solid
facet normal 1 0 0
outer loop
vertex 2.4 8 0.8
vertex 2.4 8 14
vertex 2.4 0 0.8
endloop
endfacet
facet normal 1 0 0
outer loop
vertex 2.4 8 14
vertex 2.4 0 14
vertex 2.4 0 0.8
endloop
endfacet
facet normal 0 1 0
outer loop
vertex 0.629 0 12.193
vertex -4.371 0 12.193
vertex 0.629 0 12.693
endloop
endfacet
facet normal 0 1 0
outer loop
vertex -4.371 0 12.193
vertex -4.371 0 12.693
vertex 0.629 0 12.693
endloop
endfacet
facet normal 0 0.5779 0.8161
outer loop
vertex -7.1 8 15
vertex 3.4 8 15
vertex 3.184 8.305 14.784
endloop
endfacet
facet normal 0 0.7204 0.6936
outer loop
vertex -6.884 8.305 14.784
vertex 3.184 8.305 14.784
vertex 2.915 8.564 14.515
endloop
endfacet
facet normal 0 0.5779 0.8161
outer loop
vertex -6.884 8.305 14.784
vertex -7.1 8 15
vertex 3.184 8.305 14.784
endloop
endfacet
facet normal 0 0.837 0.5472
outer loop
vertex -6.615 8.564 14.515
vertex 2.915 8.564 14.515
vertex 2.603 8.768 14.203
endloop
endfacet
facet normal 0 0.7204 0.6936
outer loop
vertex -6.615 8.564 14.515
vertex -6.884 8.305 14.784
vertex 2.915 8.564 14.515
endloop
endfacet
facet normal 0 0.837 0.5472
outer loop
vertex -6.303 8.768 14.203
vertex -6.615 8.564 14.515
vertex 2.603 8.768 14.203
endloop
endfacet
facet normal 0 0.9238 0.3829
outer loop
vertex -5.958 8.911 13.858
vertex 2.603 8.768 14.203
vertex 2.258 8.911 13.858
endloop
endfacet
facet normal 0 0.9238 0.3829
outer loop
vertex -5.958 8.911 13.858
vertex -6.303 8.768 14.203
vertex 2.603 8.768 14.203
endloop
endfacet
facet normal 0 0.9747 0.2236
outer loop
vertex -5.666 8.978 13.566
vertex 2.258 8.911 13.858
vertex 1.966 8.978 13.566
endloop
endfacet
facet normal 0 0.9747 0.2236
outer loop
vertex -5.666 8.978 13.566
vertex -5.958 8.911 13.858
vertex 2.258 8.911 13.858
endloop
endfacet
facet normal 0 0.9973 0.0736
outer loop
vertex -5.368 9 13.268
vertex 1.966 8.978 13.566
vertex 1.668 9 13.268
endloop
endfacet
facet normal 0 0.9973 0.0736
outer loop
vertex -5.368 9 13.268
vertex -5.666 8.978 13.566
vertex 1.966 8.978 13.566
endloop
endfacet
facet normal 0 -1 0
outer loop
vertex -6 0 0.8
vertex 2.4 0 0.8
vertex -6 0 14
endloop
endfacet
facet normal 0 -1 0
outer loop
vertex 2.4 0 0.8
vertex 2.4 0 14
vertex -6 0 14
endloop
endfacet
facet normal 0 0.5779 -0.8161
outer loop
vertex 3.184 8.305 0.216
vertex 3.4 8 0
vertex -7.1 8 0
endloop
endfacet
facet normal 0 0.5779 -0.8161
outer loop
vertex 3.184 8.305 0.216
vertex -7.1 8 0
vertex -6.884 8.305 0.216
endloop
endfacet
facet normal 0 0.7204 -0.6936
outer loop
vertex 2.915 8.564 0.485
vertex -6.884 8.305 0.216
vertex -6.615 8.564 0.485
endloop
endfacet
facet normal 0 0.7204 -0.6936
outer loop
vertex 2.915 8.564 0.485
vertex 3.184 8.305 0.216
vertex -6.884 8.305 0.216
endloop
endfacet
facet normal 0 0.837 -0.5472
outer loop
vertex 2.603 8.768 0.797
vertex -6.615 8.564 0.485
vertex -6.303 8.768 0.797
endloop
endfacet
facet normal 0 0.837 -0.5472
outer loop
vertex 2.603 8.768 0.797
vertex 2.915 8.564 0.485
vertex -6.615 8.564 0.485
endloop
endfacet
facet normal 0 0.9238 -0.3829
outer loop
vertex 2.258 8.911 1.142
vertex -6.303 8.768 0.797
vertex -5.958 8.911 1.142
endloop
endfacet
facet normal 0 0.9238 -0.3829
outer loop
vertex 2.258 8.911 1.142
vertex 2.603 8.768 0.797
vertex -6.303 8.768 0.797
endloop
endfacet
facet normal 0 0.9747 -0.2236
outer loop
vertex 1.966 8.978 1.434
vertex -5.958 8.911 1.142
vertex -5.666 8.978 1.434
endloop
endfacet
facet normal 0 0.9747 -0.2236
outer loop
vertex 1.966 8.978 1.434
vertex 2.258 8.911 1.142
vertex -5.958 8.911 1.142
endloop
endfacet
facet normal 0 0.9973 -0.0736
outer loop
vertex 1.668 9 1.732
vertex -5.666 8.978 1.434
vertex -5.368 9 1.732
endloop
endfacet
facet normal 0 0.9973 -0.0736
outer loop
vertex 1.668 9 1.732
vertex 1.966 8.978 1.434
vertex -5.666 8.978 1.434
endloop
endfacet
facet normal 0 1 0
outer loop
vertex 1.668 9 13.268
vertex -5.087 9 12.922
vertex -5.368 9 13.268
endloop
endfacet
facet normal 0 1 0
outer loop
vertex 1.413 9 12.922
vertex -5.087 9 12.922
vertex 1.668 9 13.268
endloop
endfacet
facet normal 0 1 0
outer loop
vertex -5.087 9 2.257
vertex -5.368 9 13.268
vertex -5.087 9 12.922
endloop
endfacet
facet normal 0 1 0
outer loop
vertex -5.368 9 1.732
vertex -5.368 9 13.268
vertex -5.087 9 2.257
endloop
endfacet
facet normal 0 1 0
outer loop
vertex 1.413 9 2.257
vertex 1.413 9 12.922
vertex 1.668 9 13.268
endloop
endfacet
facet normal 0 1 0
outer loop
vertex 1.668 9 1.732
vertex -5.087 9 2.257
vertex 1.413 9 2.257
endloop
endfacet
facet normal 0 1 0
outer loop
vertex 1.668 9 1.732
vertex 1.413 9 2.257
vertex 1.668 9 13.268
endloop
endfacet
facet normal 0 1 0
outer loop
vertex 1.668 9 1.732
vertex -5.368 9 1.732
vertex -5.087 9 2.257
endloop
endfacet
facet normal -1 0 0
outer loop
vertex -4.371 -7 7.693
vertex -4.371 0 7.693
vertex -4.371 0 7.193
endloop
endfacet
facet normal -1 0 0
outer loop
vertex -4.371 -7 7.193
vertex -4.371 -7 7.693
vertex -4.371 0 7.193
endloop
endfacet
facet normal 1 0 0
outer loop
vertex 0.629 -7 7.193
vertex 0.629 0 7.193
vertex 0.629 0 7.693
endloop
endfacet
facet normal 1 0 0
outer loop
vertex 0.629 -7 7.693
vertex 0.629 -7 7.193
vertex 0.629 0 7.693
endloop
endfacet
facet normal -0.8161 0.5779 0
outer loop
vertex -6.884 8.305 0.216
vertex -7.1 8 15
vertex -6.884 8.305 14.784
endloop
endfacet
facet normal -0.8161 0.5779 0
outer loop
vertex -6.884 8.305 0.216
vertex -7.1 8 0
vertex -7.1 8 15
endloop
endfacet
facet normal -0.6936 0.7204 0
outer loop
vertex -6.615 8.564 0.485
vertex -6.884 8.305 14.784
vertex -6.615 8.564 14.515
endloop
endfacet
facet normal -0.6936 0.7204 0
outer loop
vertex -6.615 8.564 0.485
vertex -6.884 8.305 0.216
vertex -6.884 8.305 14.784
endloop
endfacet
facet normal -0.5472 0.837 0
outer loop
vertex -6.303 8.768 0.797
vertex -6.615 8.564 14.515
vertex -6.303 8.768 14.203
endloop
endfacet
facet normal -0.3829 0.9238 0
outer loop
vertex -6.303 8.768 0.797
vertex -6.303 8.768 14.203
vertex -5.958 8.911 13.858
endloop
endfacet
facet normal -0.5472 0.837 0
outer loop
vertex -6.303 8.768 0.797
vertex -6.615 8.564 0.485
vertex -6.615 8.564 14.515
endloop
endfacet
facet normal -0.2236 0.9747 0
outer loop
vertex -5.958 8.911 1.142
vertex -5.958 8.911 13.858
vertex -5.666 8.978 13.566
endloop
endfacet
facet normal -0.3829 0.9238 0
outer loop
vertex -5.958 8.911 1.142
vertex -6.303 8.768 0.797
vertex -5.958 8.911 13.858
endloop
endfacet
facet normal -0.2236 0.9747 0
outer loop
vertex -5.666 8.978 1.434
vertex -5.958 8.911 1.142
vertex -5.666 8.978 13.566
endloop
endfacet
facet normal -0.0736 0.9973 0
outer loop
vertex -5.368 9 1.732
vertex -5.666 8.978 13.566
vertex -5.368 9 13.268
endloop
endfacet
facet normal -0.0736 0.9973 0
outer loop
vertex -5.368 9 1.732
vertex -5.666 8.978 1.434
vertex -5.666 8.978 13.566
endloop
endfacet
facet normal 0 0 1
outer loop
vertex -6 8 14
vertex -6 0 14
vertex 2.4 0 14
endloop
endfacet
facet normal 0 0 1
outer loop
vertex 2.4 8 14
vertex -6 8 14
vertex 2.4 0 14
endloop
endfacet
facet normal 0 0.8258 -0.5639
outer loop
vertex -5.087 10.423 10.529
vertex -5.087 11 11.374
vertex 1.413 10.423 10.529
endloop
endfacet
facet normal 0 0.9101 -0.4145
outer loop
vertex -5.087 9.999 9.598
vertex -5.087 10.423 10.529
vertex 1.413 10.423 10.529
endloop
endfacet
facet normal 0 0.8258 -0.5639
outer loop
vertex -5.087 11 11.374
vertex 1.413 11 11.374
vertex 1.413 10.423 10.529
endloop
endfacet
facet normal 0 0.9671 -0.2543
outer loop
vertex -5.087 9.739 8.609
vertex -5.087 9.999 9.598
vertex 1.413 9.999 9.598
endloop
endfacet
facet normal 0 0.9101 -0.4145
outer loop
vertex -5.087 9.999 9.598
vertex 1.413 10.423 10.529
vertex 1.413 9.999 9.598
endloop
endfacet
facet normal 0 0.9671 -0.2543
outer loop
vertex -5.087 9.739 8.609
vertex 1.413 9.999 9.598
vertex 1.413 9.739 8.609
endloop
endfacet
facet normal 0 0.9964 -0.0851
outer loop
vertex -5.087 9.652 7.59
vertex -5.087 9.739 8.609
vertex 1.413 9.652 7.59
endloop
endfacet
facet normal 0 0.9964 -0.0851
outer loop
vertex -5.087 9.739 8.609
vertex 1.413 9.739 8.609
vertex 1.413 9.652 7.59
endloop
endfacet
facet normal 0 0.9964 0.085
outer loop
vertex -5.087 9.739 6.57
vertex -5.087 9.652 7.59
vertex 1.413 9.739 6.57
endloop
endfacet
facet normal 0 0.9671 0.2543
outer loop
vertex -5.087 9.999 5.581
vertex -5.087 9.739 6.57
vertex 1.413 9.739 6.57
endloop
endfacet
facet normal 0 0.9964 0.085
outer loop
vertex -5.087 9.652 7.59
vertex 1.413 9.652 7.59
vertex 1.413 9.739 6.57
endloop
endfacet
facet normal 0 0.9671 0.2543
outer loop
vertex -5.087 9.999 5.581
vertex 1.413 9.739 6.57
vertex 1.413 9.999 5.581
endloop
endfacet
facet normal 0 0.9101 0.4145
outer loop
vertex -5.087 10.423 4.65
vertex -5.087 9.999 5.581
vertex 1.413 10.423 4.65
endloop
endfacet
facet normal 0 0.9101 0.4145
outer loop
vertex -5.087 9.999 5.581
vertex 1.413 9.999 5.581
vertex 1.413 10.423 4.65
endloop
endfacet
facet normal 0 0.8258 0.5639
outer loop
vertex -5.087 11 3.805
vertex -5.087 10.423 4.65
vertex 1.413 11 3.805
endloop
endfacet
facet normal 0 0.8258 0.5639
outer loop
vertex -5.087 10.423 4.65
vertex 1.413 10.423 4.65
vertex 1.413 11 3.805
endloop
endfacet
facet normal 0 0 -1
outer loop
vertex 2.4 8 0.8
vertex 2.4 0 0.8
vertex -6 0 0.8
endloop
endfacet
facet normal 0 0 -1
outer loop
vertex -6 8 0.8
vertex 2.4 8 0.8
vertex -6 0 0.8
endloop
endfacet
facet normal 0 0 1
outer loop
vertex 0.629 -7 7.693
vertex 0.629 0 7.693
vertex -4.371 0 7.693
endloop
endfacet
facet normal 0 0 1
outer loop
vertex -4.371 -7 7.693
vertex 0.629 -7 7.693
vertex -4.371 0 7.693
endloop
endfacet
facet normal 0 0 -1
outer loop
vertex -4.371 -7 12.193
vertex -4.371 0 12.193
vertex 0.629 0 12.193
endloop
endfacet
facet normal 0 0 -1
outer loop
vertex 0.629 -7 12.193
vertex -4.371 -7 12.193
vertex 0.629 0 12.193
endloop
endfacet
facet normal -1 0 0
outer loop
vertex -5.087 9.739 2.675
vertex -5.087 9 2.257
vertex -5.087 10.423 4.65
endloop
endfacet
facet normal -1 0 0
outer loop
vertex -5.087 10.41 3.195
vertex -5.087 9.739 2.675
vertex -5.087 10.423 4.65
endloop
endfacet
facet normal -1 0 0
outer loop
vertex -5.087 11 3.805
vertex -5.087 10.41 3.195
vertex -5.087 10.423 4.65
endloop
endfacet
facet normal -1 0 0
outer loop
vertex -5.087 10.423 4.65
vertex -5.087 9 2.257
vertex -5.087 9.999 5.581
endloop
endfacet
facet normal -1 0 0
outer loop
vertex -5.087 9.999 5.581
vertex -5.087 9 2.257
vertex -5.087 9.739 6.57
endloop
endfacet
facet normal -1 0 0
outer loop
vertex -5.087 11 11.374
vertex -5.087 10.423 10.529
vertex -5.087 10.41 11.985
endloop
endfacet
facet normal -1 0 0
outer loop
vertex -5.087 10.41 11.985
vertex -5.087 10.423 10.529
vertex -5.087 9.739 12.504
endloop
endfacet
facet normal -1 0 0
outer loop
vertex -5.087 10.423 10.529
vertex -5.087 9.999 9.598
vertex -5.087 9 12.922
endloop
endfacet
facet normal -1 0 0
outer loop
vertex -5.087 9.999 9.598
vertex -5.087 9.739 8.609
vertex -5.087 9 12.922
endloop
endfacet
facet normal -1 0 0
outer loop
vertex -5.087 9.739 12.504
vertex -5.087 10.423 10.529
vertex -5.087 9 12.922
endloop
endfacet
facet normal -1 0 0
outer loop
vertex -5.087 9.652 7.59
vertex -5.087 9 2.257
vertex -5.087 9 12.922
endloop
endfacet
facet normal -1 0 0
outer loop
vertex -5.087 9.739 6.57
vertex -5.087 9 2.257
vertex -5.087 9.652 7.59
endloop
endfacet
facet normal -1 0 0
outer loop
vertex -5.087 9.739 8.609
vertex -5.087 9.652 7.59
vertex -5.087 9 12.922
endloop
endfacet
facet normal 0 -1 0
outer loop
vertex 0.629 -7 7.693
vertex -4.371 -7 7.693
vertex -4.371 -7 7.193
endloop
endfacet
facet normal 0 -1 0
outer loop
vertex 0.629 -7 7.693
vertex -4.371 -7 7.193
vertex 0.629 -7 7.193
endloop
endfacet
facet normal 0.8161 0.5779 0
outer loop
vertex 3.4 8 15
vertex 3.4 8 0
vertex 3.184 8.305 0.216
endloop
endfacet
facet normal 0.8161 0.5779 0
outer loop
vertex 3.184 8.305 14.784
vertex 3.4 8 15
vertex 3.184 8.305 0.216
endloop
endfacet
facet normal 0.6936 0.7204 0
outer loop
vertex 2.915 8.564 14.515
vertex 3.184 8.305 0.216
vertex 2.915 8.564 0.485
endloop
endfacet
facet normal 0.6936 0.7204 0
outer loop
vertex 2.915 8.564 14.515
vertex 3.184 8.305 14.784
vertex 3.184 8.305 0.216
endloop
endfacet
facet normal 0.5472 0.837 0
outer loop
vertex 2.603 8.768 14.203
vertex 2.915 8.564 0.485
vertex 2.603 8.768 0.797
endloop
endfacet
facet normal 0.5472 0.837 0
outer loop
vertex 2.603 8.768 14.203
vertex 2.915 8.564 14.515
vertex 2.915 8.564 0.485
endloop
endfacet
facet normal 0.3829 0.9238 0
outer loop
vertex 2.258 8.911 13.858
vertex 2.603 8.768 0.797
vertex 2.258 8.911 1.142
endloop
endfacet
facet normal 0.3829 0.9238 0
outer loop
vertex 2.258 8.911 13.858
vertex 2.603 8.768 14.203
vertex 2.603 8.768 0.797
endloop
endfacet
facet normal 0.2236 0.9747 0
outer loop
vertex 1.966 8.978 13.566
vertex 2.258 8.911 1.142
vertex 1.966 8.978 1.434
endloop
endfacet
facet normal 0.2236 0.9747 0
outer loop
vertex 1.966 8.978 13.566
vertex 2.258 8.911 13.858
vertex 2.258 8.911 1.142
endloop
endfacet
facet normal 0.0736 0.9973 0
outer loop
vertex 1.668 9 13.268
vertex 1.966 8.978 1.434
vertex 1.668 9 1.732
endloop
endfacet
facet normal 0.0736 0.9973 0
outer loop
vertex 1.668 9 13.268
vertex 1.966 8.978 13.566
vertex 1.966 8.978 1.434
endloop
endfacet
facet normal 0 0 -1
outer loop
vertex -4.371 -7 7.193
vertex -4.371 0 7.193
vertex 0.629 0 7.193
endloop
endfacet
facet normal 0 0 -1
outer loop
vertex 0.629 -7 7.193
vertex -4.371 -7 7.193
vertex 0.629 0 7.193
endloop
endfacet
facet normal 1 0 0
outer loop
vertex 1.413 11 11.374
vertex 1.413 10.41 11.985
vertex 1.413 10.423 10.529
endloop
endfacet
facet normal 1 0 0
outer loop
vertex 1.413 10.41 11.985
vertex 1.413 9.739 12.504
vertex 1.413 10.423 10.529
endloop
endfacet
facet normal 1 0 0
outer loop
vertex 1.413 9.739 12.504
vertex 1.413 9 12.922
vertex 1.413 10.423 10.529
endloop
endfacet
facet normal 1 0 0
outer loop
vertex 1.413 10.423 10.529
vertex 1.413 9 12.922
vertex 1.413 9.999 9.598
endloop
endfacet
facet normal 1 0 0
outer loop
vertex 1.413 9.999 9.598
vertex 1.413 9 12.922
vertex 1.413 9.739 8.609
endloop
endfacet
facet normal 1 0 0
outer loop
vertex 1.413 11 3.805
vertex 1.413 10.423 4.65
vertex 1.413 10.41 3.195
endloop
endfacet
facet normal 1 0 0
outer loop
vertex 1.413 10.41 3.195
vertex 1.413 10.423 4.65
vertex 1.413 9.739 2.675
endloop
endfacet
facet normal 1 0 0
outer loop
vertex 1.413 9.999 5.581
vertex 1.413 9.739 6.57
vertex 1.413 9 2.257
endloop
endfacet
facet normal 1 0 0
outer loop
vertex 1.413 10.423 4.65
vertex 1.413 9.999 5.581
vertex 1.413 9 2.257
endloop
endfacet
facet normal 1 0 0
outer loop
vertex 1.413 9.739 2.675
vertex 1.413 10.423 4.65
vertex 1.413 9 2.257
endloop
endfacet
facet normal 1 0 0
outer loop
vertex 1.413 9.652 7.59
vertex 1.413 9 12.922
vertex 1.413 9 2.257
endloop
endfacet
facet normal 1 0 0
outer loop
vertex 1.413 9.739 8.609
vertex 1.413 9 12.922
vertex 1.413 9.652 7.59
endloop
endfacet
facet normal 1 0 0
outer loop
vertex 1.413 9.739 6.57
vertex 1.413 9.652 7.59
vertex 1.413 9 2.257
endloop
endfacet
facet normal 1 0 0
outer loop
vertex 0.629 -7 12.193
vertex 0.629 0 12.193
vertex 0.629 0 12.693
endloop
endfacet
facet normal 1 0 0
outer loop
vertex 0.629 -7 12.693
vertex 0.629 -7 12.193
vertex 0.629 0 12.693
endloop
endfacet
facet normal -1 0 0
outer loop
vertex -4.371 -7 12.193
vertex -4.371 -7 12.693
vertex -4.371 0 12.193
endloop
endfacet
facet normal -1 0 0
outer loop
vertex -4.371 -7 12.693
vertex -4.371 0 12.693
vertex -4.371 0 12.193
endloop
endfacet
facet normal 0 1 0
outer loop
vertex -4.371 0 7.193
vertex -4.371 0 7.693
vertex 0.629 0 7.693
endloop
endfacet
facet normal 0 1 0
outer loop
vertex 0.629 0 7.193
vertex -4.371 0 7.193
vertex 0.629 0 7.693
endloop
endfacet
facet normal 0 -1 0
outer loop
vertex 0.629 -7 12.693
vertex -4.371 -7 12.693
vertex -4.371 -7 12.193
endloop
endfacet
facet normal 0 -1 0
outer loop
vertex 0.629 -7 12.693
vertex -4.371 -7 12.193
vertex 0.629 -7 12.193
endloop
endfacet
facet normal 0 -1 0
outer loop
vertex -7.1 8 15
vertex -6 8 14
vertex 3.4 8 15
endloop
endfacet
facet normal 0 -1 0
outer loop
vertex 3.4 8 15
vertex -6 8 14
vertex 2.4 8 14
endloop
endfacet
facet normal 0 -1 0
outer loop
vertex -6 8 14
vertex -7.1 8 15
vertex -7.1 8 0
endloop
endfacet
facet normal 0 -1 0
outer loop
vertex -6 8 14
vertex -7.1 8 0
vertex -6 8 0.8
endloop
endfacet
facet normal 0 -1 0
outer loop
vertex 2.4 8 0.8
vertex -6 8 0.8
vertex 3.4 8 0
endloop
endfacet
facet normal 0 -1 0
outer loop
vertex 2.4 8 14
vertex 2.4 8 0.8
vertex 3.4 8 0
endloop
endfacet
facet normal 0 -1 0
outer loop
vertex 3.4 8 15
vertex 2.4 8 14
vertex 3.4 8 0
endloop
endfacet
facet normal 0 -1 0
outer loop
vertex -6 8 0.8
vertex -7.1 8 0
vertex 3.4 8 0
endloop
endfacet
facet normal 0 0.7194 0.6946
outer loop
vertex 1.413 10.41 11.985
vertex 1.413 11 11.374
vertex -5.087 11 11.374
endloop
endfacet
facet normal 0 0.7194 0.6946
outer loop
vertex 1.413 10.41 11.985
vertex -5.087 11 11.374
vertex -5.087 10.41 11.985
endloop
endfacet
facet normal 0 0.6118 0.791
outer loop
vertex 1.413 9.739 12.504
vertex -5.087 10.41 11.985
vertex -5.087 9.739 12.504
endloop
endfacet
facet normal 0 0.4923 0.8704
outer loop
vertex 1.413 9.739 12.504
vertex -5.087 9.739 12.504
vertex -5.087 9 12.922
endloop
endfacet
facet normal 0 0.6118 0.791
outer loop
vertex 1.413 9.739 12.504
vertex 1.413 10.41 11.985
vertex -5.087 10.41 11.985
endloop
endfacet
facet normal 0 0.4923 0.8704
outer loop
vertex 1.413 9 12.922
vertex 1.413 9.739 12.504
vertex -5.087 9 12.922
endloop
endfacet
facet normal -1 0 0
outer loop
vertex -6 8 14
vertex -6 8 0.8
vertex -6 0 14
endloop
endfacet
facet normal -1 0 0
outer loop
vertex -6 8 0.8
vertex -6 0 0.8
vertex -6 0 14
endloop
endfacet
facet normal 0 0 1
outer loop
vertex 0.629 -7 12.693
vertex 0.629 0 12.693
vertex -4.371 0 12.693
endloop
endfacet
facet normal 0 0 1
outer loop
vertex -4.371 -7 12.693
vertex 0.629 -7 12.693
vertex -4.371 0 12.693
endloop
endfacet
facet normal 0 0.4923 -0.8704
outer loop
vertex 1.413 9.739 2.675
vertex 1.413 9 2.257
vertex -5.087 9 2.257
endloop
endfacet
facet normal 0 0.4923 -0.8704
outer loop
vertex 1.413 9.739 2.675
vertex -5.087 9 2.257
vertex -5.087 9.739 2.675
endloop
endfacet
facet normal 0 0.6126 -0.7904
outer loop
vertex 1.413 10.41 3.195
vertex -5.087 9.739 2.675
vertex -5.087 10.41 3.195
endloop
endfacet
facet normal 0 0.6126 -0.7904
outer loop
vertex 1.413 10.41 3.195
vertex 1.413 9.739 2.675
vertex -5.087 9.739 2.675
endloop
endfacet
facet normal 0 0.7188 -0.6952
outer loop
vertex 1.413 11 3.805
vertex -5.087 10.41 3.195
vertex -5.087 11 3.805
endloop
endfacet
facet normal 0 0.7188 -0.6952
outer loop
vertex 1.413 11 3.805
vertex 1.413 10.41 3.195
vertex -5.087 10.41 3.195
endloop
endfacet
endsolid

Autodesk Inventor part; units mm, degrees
ref_plane "YZ Plane" through (0, 0, 0) normal (1, 0, 0) x (0, 1, 0)
ref_plane "XZ Plane" through (0, 0, 0) normal (0, 1, 0) x (-1, 0, 0)
ref_plane "XY Plane" through (0, 0, 0) normal (0, 0, 1) x (1, 0, 0)
sketch "Эскиз1" plane through (0, 0, 0) normal (0, 1, 0) x (-1, 0, 0)
  line L0 (6, 14) -> (-2.4, 14)
  line L1 (-2.4, 14) -> (-2.4, 0.8)
  line L2 (-2.4, 0.8) -> (6, 0.8)
  line L3 (6, 0.8) -> (6, 14)
  point P0 (0, 0)
  dimension "d0" = 8.4
  dimension "d1" = 13.2
extrude "Выдавливание1" add sketch "Эскиз1" along normal blind 8
sketch "Эскиз2" plane through (0, 8, 0) normal (0, 1, 0) x (1, 0, 0)
  line L0 (-7.1, -15) -> (3.4, -15)
  line L1 (3.4, -15) -> (3.4, 0)
  line L2 (3.4, 0) -> (-7.1, 0)
  line L3 (-7.1, 0) -> (-7.1, -15)
  line L4 (-6, -14) -> (2.4, -14) projected
  line L5 (-6, -0.8) -> (-6, -14) projected
  point P0 (0, 0)
  dimension "d4" = 10.5
  dimension "d5" = 15
  dimension "d6" = 1
  dimension "d7" = 1.1
extrude "Выдавливание2" add sketch "Эскиз2" along normal blind 1
fillet "Сопряжение1" radius 2 4 edges at (-1.85, 9, 15) (3.4, 9, 7.5) (-1.85, 9, 0) (-7.1, 9, 7.5)
sketch "Эскиз3" plane through (0, 9, 0) normal (0, 1, 0) x (1, 0, 0)
  line L0 (-5.0869, -12.9218) -> (1.4131, -12.9218)
  line L1 (1.4131, -12.9218) -> (1.4131, -2.2574)
  line L2 (1.4131, -2.2574) -> (-5.0869, -2.2574)
  line L3 (-5.0869, -2.2574) -> (-5.0869, -12.9218)
  line L4 (-5.3679, -13.2679) -> (-5.3679, -1.7321) projected
  point P0 (0, 0)
  dimension "d12" = 6.5
extrude "Выдавливание3" add sketch "Эскиз3" along normal blind 2
sketch "Эскиз4" plane through (1.4131, 9, 12.9218) normal (1, 0, 0) x (0, 0, -1)
  arc A0 (1.5475, 2) -> (9.1169, 2) centre (5.3322, -2.5272) ccw
  line L0 (0, 0) -> (0, 2)
  line L1 (0, 2) -> (1.5475, 2)
  line L2 (10.6644, 0) -> (10.6644, 2) projected
  line L3 (9.1169, 2) -> (10.6644, 2)
  arc A1 (1.5475, 2) -> (9.1169, 2) centre (5.3322, 6.6369) ccw
  line L4 (1.5475, 2) -> (9.1169, 2)
  line L5 (10.6644, 2) -> (0, 2) projected
  point P0 (12.9218, -9)
extrude "Выдавливание4" cut sketch "Эскиз4" against normal through all contours A0 L0 L1 | L4 A1 | L3 L2 A0
sketch "Эскиз5" plane through (0, 0, 0) normal (0, -1, 0) x (1, 0, 0)
  line L0 (0.6293, 12.6934) -> (-4.3707, 12.6934)
  line L1 (-4.3707, 12.6934) -> (-4.3707, 12.1934)
  line L2 (-4.3707, 12.1934) -> (0.6293, 12.1934)
  line L3 (0.6293, 12.1934) -> (0.6293, 12.6934)
  line L4 (0.6293, 7.6934) -> (-4.3707, 7.6934)
  line L5 (-4.3707, 7.6934) -> (-4.3707, 7.1934)
  line L6 (-4.3707, 7.1934) -> (0.6293, 7.1934)
  line L7 (0.6293, 7.1934) -> (0.6293, 7.6934)
  point P0 (0, 0)
  dimension "d18" = 5
  dimension "d19" = 0.5
  dimension "d22" = 5
extrude "Выдавливание5" add sketch "Эскиз5" along normal blind 7 separate body
properties part number "Выключатель маленький"
